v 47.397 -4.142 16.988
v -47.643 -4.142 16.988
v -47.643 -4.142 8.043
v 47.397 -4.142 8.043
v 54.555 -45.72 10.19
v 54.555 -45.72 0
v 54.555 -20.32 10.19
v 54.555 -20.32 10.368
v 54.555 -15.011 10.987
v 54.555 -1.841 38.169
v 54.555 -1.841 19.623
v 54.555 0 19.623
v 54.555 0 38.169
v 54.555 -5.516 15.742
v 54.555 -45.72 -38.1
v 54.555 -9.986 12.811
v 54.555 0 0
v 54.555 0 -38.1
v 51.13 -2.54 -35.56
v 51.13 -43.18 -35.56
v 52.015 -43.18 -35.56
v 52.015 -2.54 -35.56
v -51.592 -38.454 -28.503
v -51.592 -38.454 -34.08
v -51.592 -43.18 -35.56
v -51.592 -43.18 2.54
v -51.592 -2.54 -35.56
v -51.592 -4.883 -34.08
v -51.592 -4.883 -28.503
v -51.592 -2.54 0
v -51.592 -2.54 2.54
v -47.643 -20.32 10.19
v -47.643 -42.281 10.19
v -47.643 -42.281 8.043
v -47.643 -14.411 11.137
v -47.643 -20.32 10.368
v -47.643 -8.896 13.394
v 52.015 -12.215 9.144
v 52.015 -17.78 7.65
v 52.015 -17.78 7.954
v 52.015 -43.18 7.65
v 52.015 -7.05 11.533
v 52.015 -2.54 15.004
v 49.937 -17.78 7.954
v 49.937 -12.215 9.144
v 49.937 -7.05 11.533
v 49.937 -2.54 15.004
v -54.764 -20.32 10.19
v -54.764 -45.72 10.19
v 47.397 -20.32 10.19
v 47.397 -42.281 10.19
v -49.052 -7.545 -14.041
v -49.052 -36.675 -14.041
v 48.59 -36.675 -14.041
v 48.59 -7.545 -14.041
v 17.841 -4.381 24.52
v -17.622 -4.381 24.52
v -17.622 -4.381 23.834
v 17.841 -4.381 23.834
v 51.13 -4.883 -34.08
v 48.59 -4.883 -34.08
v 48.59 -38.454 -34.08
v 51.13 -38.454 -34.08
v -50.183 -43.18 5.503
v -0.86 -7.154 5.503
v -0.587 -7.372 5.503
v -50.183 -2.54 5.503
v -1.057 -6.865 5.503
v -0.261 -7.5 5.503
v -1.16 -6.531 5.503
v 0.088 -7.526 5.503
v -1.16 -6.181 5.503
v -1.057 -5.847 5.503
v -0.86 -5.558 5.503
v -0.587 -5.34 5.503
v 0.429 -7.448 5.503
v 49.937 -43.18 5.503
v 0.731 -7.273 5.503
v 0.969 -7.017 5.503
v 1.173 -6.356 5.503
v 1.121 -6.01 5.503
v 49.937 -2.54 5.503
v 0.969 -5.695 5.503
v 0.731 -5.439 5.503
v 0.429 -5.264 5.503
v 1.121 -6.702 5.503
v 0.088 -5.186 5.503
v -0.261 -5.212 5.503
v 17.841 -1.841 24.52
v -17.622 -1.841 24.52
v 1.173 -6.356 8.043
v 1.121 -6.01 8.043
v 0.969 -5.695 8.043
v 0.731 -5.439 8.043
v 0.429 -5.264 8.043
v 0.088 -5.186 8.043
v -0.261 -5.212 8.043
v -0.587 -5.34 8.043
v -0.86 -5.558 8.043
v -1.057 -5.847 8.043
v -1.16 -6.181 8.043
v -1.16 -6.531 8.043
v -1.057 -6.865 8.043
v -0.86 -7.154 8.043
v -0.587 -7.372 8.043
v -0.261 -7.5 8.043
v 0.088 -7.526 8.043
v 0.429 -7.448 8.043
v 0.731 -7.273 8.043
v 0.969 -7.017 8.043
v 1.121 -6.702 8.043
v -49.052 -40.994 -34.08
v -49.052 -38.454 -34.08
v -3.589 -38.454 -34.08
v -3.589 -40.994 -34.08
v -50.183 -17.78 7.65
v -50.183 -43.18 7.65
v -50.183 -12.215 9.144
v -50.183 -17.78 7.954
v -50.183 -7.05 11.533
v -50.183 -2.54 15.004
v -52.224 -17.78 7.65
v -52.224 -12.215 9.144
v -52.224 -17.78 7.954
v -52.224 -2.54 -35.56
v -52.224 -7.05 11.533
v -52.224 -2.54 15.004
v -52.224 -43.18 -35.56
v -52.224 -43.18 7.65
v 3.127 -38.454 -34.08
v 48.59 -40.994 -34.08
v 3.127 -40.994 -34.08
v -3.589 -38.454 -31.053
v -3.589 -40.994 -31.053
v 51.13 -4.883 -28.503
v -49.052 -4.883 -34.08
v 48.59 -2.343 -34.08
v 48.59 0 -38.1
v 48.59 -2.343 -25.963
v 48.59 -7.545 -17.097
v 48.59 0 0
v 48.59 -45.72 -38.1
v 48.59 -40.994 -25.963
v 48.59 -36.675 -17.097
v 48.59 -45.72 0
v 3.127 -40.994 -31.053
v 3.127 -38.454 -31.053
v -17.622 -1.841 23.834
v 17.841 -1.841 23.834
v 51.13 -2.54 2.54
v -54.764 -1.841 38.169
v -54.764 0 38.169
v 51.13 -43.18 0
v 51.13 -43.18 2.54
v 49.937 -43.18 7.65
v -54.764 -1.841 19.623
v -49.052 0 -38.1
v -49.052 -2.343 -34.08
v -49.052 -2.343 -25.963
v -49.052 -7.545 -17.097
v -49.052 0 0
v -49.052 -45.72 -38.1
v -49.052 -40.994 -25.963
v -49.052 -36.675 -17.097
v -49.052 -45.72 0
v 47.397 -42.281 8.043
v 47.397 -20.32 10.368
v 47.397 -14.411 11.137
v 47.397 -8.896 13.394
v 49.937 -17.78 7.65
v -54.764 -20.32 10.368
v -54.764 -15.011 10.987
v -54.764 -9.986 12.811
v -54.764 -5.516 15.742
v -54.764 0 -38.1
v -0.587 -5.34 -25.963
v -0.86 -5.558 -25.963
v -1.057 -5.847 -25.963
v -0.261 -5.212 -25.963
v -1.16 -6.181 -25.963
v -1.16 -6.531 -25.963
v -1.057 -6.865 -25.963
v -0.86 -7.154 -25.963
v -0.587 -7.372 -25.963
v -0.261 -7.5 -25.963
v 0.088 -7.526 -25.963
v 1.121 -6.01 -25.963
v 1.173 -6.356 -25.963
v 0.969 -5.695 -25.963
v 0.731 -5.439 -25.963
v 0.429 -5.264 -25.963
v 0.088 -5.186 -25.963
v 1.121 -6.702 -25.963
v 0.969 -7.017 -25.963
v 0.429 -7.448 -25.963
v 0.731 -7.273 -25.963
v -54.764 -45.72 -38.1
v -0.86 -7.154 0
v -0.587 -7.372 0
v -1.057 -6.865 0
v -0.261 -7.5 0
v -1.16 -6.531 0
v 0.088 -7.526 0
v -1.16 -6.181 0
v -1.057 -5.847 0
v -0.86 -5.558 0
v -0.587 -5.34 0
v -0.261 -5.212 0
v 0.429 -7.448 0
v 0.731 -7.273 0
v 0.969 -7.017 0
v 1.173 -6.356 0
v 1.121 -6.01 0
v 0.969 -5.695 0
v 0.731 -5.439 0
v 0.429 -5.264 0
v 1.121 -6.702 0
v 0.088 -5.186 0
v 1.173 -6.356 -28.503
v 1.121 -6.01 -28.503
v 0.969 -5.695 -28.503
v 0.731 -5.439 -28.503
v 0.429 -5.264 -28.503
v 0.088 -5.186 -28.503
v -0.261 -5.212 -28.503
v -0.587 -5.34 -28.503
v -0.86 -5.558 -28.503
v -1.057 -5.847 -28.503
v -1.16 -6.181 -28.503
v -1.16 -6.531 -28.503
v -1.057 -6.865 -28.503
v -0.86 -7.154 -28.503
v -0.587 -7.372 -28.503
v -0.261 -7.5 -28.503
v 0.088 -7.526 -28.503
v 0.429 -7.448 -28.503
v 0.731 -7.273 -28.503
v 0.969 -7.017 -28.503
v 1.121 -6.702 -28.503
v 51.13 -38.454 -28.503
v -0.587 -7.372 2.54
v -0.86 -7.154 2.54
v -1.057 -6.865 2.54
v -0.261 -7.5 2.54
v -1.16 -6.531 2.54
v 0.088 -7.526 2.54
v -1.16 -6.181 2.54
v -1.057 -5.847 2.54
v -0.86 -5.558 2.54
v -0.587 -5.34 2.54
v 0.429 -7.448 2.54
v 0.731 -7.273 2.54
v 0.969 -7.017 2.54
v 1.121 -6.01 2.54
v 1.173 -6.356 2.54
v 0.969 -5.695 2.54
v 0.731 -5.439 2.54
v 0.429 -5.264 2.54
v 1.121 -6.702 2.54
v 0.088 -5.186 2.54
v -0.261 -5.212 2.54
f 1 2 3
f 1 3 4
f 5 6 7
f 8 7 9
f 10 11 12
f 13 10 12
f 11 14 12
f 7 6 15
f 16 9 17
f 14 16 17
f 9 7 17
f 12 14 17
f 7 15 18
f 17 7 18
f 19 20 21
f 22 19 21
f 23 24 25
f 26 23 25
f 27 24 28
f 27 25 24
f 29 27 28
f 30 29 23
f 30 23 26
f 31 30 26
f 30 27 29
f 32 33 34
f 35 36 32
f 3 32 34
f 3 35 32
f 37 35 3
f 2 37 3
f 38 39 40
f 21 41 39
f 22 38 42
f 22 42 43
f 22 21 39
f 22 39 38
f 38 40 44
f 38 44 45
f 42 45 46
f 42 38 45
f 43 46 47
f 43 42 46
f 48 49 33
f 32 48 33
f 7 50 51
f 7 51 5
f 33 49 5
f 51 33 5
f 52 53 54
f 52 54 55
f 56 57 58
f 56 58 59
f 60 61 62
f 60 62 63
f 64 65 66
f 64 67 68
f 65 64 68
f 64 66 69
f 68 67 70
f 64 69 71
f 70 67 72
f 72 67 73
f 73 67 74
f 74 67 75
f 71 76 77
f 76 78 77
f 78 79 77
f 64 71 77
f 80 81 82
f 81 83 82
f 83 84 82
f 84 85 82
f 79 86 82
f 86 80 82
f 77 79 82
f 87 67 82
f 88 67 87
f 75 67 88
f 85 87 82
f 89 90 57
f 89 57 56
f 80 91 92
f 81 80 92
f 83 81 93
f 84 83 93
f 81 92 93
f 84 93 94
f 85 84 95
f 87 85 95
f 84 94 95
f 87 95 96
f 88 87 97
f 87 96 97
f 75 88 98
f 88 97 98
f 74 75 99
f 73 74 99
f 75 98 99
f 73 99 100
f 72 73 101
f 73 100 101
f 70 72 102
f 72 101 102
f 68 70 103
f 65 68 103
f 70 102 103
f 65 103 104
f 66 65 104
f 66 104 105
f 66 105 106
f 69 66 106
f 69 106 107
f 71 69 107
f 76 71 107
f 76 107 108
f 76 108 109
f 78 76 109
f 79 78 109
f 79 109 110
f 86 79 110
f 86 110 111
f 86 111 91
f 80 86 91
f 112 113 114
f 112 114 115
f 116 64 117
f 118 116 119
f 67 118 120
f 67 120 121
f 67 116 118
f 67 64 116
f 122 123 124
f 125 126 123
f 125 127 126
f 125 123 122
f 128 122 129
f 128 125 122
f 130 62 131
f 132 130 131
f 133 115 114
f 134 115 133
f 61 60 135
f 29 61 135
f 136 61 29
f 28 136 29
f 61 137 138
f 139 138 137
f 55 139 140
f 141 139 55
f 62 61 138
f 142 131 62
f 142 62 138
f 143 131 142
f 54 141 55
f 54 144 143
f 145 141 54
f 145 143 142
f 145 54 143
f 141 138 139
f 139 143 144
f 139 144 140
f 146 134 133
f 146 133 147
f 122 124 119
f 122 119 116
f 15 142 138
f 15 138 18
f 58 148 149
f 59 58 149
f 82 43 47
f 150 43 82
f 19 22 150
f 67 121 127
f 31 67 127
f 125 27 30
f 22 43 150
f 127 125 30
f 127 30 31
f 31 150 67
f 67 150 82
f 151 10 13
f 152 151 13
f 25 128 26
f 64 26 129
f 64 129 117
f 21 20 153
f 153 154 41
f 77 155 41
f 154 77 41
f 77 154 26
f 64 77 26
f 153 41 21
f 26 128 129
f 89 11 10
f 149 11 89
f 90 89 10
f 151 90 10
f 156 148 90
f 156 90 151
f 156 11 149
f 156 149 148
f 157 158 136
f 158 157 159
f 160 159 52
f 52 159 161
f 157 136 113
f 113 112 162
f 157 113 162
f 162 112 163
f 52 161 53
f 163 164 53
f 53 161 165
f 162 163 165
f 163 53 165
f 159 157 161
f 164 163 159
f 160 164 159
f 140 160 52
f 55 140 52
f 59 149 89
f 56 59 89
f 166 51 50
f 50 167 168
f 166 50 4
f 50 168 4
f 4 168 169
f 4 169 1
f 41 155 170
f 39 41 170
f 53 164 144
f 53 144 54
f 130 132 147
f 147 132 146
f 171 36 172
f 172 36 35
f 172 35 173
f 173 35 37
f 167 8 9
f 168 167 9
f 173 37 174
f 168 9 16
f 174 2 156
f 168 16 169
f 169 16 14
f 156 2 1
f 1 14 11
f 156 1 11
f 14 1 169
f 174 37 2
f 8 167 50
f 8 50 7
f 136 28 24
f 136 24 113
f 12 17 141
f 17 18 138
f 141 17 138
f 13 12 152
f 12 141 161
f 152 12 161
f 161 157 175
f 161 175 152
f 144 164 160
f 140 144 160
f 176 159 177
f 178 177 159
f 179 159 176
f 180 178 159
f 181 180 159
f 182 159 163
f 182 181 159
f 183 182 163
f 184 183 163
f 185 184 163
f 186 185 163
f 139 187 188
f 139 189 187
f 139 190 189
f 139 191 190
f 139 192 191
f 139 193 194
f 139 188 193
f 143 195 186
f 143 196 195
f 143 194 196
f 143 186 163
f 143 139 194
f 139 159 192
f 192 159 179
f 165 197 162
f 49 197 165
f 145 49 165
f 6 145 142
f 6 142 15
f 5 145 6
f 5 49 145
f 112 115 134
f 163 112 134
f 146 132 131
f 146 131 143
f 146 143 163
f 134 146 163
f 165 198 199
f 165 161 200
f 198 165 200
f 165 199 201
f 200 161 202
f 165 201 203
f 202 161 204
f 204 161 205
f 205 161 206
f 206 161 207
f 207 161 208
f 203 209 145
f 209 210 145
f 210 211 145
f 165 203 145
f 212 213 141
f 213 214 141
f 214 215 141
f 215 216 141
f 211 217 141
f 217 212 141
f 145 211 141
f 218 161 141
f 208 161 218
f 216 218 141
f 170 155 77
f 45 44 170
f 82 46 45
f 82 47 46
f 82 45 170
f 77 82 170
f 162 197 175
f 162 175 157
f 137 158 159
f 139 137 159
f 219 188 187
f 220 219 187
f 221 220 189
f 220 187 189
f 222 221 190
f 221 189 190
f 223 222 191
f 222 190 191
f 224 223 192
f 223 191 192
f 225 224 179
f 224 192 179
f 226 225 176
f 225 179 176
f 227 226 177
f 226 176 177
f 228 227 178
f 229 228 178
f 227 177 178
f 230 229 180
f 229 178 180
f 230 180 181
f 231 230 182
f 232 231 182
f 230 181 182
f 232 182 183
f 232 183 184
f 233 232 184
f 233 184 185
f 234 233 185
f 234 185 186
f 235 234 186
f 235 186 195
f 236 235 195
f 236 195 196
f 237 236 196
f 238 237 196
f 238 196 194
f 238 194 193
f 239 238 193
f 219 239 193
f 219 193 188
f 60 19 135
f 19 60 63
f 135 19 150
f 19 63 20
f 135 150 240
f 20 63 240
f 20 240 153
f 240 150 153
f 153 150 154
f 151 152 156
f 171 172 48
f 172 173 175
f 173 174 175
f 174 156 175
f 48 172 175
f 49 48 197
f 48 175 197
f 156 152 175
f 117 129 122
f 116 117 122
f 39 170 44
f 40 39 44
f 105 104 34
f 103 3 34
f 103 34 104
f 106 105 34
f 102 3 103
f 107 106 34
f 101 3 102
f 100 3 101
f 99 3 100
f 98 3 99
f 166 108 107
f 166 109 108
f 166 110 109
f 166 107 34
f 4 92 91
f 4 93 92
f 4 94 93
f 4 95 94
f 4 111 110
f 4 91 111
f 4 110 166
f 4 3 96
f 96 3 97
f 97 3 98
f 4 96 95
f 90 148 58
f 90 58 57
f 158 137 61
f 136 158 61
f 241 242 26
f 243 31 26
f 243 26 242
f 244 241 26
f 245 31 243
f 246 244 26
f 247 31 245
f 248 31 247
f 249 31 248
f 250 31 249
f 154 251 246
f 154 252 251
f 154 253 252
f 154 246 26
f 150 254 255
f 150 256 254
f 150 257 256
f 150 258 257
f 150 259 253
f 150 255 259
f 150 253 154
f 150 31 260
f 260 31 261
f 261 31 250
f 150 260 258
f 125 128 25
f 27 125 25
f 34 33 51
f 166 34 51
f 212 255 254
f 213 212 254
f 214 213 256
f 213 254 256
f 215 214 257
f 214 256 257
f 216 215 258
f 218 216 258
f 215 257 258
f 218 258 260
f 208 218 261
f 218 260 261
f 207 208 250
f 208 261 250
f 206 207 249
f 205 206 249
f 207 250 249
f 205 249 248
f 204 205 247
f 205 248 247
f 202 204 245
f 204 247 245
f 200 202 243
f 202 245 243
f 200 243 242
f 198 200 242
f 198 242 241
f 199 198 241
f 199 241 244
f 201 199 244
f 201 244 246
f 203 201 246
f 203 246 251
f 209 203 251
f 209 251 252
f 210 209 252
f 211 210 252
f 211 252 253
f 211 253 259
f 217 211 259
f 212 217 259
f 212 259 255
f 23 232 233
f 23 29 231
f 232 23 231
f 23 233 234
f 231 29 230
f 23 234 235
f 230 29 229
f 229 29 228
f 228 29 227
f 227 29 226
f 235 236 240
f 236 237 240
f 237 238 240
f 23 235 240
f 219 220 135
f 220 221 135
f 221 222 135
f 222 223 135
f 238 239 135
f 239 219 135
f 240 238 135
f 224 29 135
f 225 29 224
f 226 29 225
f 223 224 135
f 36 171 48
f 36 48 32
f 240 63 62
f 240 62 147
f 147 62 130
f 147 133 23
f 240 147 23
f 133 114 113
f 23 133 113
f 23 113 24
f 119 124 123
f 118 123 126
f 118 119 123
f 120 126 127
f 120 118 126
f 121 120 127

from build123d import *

# Parameters (mm, degrees)
F0_W          = 109.3183457851
F0_H          = 33.4434658289
F1_DEPTH      = 45.72
F2_W          = 95.0407683849
F2_H          = 38.138333708
F3_DEPTH      = 25.4
F4_W          = 109.3183457851
F4_H          = 23.2531316578
F5_DEPTH      = 25.4
F7_DEPTH      = 254
F9_W          = 5.9644132853
F9_H          = 45.72
F9_W_2        = 5.7119317353
F10_DEPTH     = 38.1
F11_W         = 29.130092822
F11_H         = 3.0559636652
F12_DEPTH     = 101.6
F14_DEPTH     = 127
F15_DEPTH     = 18.5456499457
F16_W         = 35.4631710798
F16_H         = 0.6852131337
F17_DEPTH     = 2.54
F18_W         = 38.6509299278
F18_H         = 8.1171598285
F19_DEPTH     = 99.9768525362
F20_T         = 2.54
F20_T3_DEPTH  = 114.3983457851
F20_T5_DEPTH  = 40.5431710798
F20_T7_DEPTH  = 5.7652131337
F20_T9_DEPTH  = 12.2003224361
F20_T11_DEPTH = 12.2372549641
F20_T13_DEPTH = 50.8
F20_T15_DEPTH = 13.1971598285
F20_T17_DEPTH = 43.7309299278
F20_T19_DEPTH = 34.210092822
F20_T21_DEPTH = 8.1359636652
F20_T23_DEPTH = 7.2268683422
F20_T25_DEPTH = 43.218333708
F20_T27_DEPTH = 14.0249238314
F20_T29_DEPTH = 100.1207683849
F21_W         = 6.7161731422
F21_H         = 3.0271708965
F22_DEPTH     = 25.4
F8_R          = 1.1732121366
F23_DEPTH     = 69.3976804614


# Not quite as in the source:
# - a shell that OpenCascade refuses in one call is made with other operations: the cavity is built on its own and cut out


with BuildPart() as f1:
    # F0 (on Front) → F1 (new body)
    with BuildSketch(Plane.XZ):
        with Locations((-0.1045018435, 16.7217329144)):
            Rectangle(F0_W, F0_H)
    extrude(amount=F1_DEPTH)

    # F2 (on face) → F3 (cut)
    with BuildSketch(Plane.XY.offset(33.4434658289)):
        with Locations((-0.1229681075, -23.2116412371)):
            Rectangle(F2_W, F2_H)
    extrude(amount=-F3_DEPTH, mode=Mode.SUBTRACT)

    # F4 (on face) → F5 (cut)
    with BuildSketch(Plane.XZ.offset(45.72)):
        with Locations((-0.1045018435, 21.8169)):
            Rectangle(F4_W, F4_H)
    extrude(amount=-F5_DEPTH, mode=Mode.SUBTRACT)

    # F6 (on face) → F7 (cut)
    with BuildSketch(Plane.YZ.offset(54.5546710491)):
        with BuildLine():
            Line((-20.32, 33.4434658289), (-20.32, 10.3678972162))
            ThreePointArc((-20.32, 10.3678972162), (-8.4847772871, 13.6341404962), (0, 22.5082261516))
            Line((0, 22.5082261516), (0, 33.4434658289))
            Line((0, 33.4434658289), (-20.32, 33.4434658289))
        make_face()
        with BuildLine():
            ThreePointArc((0, 22.5082261516), (2.0560745106, 27.8049237926), (2.7555686127, 33.4434658289))
            ThreePointArc((2.7555686127, 33.4434658289), (-36.6368910458, 49.7603568747), (-20.32, 10.3678972162))
            Line((-20.32, 10.3678972162), (-20.32, 33.4434658289))
            Line((-20.32, 33.4434658289), (0, 33.4434658289))
            Line((0, 33.4434658289), (0, 22.5082261516))
        make_face()
    extrude(amount=-F7_DEPTH, mode=Mode.SUBTRACT)

    # F9 (on face) → F10 (join)
    with BuildSketch(Plane(origin=(0, 0, 0), x_dir=(1, 0, 0), z_dir=(0, 0, -1))):
        with Locations((51.5724644065, 22.86)):
            Rectangle(F9_W, F9_H)
        with Locations((-51.9077088684, 22.86)):
            Rectangle(F9_W_2, F9_H)
    extrude(amount=F10_DEPTH)

    # F11 (on face) → F12 (join)
    with BuildSketch(Plane.YZ.offset(-49.0517430007)):
        with Locations((-22.1103844233, -15.5687723309)):
            Rectangle(F11_W, F11_H)
    extrude(amount=F12_DEPTH)

    # F13 (on face) → F14 (cut)
    with BuildSketch(Plane.YZ.offset(54.5546710491)):
        with BuildLine():
            ThreePointArc((0, 22.5082261516), (-0.8668457158, 21.0315096899), (-1.8408102843, 19.6231397021))
            Line((-1.8408102843, 19.6231397021), (0, 19.6231397021))
            Line((0, 19.6231397021), (0, 22.5082261516))
        make_face()
    extrude(amount=-F14_DEPTH, mode=Mode.SUBTRACT)

    # F15 (add): a face of the model
    f15_faces = [f1.faces().sort_by_distance(p)[0] for p in [
        (-0.1045018435, -0.9204051421, 19.6231397021),
    ]]
    extrude(f15_faces, amount=F15_DEPTH)

    # F16 (on face) → F17 (join)
    with BuildSketch(Plane.XZ.offset(1.8408102843)):
        with Locations((0.1093326136, 24.1770995781)):
            Rectangle(F16_W, F16_H)
    extrude(amount=F17_DEPTH)

    # F18 (on face) → F19 (join)
    with BuildSketch(Plane(origin=(48.5902577639, 0, 0), x_dir=(0, -1, 0), z_dir=(-1, 0, 0))):
        with Locations((21.6686017811, -30.0215007737)):
            Rectangle(F18_W, F18_H)
    extrude(amount=F19_DEPTH)

    # F20: shell of thickness 2.54, made by hand


with BuildPart() as f20_core1:
    # F20_t2: copy of F1
    add(f1.part)

    # the walls: a layer under each face that stays
    f20_faces = [f20_core1.faces().sort_by_distance(p)[0] for p in [
        (-54.763674736, -22.86, 0.0343948239),
        (-0.1045018435, 0, 0.0343948239),
        (-0.1045018435, -0.9204051421, 38.1687896479),
        (-0.1045018435, -1.8408102843, 28.895964675),
        (-46.9552214657, -2.7975084588, 18.4286678952),
        (-51.203513518, -20.32, 10.2791156936),
        (-46.9552214657, -43.9057142857, 10.1903341711),
        (-36.5439504385, -45.72, 2.1419451425),
        (-51.9077088684, -22.86, -38.1),
        (54.5546710491, -22.86, 0.0343948239),
        (-49.0517430007, -22.86, -19.05),
        (-0.2307426184, -22.86, 0),
        (48.5902577639, -22.86, -19.05),
        (51.5724644065, -22.86, -38.1),
        (0.1093326136, -3.1108102843, 24.5197061449),
        (-17.6222529262, -3.1108102843, 24.1770995781),
        (0.1093326136, -3.1108102843, 23.8344930112),
        (17.8409181535, -3.1108102843, 24.1770995781),
        (-47.6433522999, -10.4988633345, 9.5342864675),
        (-0.1229681075, -4.1424743831, 12.5159277446),
        (47.397416085, -35.9244191398, 9.5342864675),
        (50.9760435671, -20.32, 10.2791156936),
        (-0.1229681075, -42.2808080912, 9.1169),
        (-0.2307426184, -40.994066745, -30.0215007737),
        (-0.2307426184, -21.6686017811, -25.9629208595),
        (-0.2307426184, -2.3431368172, -30.0215007737),
        (-0.2307426184, -22.1103844233, -14.0407904983),
        (-0.2307426184, -7.5453380123, -15.5687723309),
        (-0.2307426184, -36.6754308343, -15.5687723309),
        (-0.2307426184, -22.1103844233, -17.0967541635),
        (0.1093326136, -4.3808102843, 24.1770995781),
        (-0.1229681075, -23.2116412371, 8.0434658289),
    ]]
    thicken(f20_faces, amount=-F20_T, mode=Mode.SUBTRACT)

    # F20_s4 → F20_t3 (cut)
    with BuildSketch(Plane.YZ.offset(-57.303674736)):
        Polygon((-1.8865509063, 19.6383521673), (0.6991897157, 19.6231397021), (0.6991897157, 18.7783837759), (0.1932519166, 18.1018931859), align=None)
    extrude(amount=F20_T3_DEPTH, mode=Mode.SUBTRACT)

    # F20_s6 → F20_t5 (cut)
    with BuildSketch(Plane.YZ.offset(-20.1622529262)):
        Polygon((-1.8662102843, 24.5451061449), (0.6991897157, 24.5197061449), (0.6991897157, 21.9797061449), (-1.8408102843, 21.9797061449), align=None)
        Polygon((-1.8662102843, 23.8090930112), (0.6991897157, 23.8344930112), (0.6991897157, 26.3744930112), (-1.8408102843, 26.3744930112), align=None)
    extrude(amount=F20_T5_DEPTH, mode=Mode.SUBTRACT)

    # F20_s8 → F20_t7 (cut)
    with BuildSketch(Plane.XY.offset(21.2944930112)):
        Polygon((-17.6476529262, -1.8662102843), (-17.6222529262, 0.6991897157), (-15.0822529262, 0.6991897157), (-15.0822529262, -1.8408102843), align=None)
        Polygon((17.8663181535, -1.8662102843), (17.8409181535, 0.6991897157), (15.3009181535, 0.6991897157), (15.3009181535, -1.8408102843), align=None)
    extrude(amount=F20_T7_DEPTH, mode=Mode.SUBTRACT)

    # F20_s10 → F20_t9 (cut)
    with BuildSketch(Plane.YZ.offset(-57.303674736)):
        Polygon((-20.3454, 10.2157341711), (-17.78, 10.1903341711), (-17.78, 7.6503341711), (-20.32, 7.6503341711), align=None)
    extrude(amount=F20_T9_DEPTH, mode=Mode.SUBTRACT)

    # F20_s12 → F20_t11 (cut)
    with BuildSketch(Plane.YZ.offset(44.857416085)):
        Polygon((-20.3454, 10.2157341711), (-20.32, 7.6503341711), (-17.78, 7.6503341711), (-17.78, 10.1903341711), align=None)
    extrude(amount=F20_T11_DEPTH, mode=Mode.SUBTRACT)

    # F20_s14 → F20_t13 (cut)
    with BuildSketch(Plane.XZ.offset(-2.54)):
        Polygon((-49.0263430007, -0.0254), (-51.5917430007, 0), (-51.5917430007, 2.54), (-49.0517430007, 2.54), align=None)
        Polygon((48.5648577639, -0.0254), (48.5902577639, 2.54), (51.1302577639, 2.54), (51.1302577639, 0), align=None)
    extrude(amount=F20_T13_DEPTH, mode=Mode.SUBTRACT)

    # F20_s16 → F20_t15 (cut)
    with BuildSketch(Plane.XY.offset(-36.620080688)):
        Polygon((-49.0263430007, -41.019466745), (-51.5917430007, -40.994066745), (-51.5917430007, -38.454066745), (-49.0517430007, -38.454066745), align=None)
        Polygon((-49.0263430007, -2.3177368172), (-51.5917430007, -2.3431368172), (-51.5917430007, -4.8831368172), (-49.0517430007, -4.8831368172), align=None)
        Polygon((48.5648577639, -2.3177368172), (51.1302577639, -2.3431368172), (51.1302577639, -4.8831368172), (48.5902577639, -4.8831368172), align=None)
        Polygon((48.5648577639, -41.019466745), (51.1302577639, -40.994066745), (51.1302577639, -38.454066745), (48.5902577639, -38.454066745), align=None)
    extrude(amount=F20_T15_DEPTH, mode=Mode.SUBTRACT)

    # F20_s18 → F20_t17 (cut)
    with BuildSketch(Plane.XZ.offset(-0.1968631828)):
        Polygon((-49.0263430007, -25.9375208595), (-51.5917430007, -25.9629208595), (-51.5917430007, -28.5029208595), (-49.0517430007, -28.5029208595), align=None)
        Polygon((48.5648577639, -25.9375208595), (51.1302577639, -25.9629208595), (51.1302577639, -28.5029208595), (48.5902577639, -28.5029208595), align=None)
    extrude(amount=F20_T17_DEPTH, mode=Mode.SUBTRACT)

    # F20_s20 → F20_t19 (cut)
    with BuildSketch(Plane.XZ.offset(5.0053380123)):
        Polygon((-49.0263430007, -14.0153904983), (-51.5917430007, -14.0407904983), (-51.5917430007, -16.5807904983), (-49.0517430007, -16.5807904983), align=None)
        Polygon((-49.0263430007, -17.1221541635), (-51.5917430007, -17.0967541635), (-51.5917430007, -14.5567541635), (-49.0517430007, -14.5567541635), align=None)
        Polygon((48.5648577639, -17.1221541635), (51.1302577639, -17.0967541635), (51.1302577639, -14.5567541635), (48.5902577639, -14.5567541635), align=None)
        Polygon((48.5648577639, -14.0153904983), (51.1302577639, -14.0407904983), (51.1302577639, -16.5807904983), (48.5902577639, -16.5807904983), align=None)
    extrude(amount=F20_T19_DEPTH, mode=Mode.SUBTRACT)

    # F20_s22 → F20_t21 (cut)
    with BuildSketch(Plane.XY.offset(-19.6367541635)):
        Polygon((-49.0263430007, -7.5199380123), (-51.5917430007, -7.5453380123), (-51.5917430007, -10.0853380123), (-49.0517430007, -10.0853380123), align=None)
        Polygon((-49.0263430007, -36.7008308343), (-51.5917430007, -36.6754308343), (-51.5917430007, -34.1354308343), (-49.0517430007, -34.1354308343), align=None)
        Polygon((48.5648577639, -7.5199380123), (51.1302577639, -7.5453380123), (51.1302577639, -10.0853380123), (48.5902577639, -10.0853380123), align=None)
        Polygon((48.5648577639, -36.7008308343), (51.1302577639, -36.6754308343), (51.1302577639, -34.1354308343), (48.5902577639, -34.1354308343), align=None)
    extrude(amount=F20_T21_DEPTH, mode=Mode.SUBTRACT)

    # F20_s24 → F20_t23 (cut)
    with BuildSketch(Plane.XY.offset(5.5034658289)):
        Polygon((-47.6179522999, -42.2554080912), (-50.1833522999, -42.2808080912), (-50.1833522999, -44.8208080912), (-47.6433522999, -44.8208080912), align=None)
        Polygon((47.372016085, -42.2554080912), (49.937416085, -42.2808080912), (49.937416085, -44.8208080912), (47.397416085, -44.8208080912), align=None)
    extrude(amount=F20_T23_DEPTH, mode=Mode.SUBTRACT)

    # F20_s26 → F20_t25 (cut)
    with BuildSketch(Plane.XZ.offset(1.6024743831)):
        Polygon((-47.6179522999, 8.0688658289), (-50.1833522999, 8.0434658289), (-50.1833522999, 5.5034658289), (-47.6433522999, 5.5034658289), align=None)
        Polygon((47.372016085, 8.0688658289), (49.937416085, 8.0434658289), (49.937416085, 5.5034658289), (47.397416085, 5.5034658289), align=None)
    extrude(amount=F20_T25_DEPTH, mode=Mode.SUBTRACT)

    # F20_s28 → F20_t27 (cut)
    with BuildSketch(Plane.XY.offset(5.5034658289)):
        Polygon((-47.6179522999, -4.1678743831), (-50.1833522999, -4.1424743831), (-50.1833522999, -1.6024743831), (-47.6433522999, -1.6024743831), align=None)
        Polygon((47.372016085, -4.1678743831), (47.397416085, -1.6024743831), (49.937416085, -1.6024743831), (49.937416085, -4.1424743831), align=None)
    extrude(amount=F20_T27_DEPTH, mode=Mode.SUBTRACT)

    # F20_s30 → F20_t29 (cut)
    with BuildSketch(Plane.YZ.offset(-50.1833522999)):
        Polygon((-4.1678743831, 8.0688658289), (-1.6024743831, 8.0434658289), (-1.6024743831, 5.5034658289), (-4.1424743831, 5.5034658289), align=None)
        Polygon((-42.2554080912, 8.0688658289), (-44.8208080912, 8.0434658289), (-44.8208080912, 5.5034658289), (-42.2808080912, 5.5034658289), align=None)
    extrude(amount=F20_T29_DEPTH, mode=Mode.SUBTRACT)


with BuildPart() as f1_1:
    add(f1.part)

    # what is left inside the walls is the cavity
    f20_cavity = [f20_core1.part.solids().sort_by_distance(p)[0] for p in [
        (-0.230743, -29.633333, 2.5654),
    ]]
    add(f20_cavity, mode=Mode.SUBTRACT)

    # F21 (on face) → F22 (cut)
    with BuildSketch(Plane.XZ.offset(40.994066745)):
        with Locations((-0.2307426184, -32.5664952397)):
            Rectangle(F21_W, F21_H)
    extrude(amount=-F22_DEPTH, mode=Mode.SUBTRACT)

    # F8 (on face) → F23 (cut)
    with BuildSketch(Plane.XY.offset(8.0434658289)):
        with Locations((0, -6.3559673727)):
            Circle(F8_R)
    extrude(amount=-F23_DEPTH, mode=Mode.SUBTRACT)


solid = f1_1.part
